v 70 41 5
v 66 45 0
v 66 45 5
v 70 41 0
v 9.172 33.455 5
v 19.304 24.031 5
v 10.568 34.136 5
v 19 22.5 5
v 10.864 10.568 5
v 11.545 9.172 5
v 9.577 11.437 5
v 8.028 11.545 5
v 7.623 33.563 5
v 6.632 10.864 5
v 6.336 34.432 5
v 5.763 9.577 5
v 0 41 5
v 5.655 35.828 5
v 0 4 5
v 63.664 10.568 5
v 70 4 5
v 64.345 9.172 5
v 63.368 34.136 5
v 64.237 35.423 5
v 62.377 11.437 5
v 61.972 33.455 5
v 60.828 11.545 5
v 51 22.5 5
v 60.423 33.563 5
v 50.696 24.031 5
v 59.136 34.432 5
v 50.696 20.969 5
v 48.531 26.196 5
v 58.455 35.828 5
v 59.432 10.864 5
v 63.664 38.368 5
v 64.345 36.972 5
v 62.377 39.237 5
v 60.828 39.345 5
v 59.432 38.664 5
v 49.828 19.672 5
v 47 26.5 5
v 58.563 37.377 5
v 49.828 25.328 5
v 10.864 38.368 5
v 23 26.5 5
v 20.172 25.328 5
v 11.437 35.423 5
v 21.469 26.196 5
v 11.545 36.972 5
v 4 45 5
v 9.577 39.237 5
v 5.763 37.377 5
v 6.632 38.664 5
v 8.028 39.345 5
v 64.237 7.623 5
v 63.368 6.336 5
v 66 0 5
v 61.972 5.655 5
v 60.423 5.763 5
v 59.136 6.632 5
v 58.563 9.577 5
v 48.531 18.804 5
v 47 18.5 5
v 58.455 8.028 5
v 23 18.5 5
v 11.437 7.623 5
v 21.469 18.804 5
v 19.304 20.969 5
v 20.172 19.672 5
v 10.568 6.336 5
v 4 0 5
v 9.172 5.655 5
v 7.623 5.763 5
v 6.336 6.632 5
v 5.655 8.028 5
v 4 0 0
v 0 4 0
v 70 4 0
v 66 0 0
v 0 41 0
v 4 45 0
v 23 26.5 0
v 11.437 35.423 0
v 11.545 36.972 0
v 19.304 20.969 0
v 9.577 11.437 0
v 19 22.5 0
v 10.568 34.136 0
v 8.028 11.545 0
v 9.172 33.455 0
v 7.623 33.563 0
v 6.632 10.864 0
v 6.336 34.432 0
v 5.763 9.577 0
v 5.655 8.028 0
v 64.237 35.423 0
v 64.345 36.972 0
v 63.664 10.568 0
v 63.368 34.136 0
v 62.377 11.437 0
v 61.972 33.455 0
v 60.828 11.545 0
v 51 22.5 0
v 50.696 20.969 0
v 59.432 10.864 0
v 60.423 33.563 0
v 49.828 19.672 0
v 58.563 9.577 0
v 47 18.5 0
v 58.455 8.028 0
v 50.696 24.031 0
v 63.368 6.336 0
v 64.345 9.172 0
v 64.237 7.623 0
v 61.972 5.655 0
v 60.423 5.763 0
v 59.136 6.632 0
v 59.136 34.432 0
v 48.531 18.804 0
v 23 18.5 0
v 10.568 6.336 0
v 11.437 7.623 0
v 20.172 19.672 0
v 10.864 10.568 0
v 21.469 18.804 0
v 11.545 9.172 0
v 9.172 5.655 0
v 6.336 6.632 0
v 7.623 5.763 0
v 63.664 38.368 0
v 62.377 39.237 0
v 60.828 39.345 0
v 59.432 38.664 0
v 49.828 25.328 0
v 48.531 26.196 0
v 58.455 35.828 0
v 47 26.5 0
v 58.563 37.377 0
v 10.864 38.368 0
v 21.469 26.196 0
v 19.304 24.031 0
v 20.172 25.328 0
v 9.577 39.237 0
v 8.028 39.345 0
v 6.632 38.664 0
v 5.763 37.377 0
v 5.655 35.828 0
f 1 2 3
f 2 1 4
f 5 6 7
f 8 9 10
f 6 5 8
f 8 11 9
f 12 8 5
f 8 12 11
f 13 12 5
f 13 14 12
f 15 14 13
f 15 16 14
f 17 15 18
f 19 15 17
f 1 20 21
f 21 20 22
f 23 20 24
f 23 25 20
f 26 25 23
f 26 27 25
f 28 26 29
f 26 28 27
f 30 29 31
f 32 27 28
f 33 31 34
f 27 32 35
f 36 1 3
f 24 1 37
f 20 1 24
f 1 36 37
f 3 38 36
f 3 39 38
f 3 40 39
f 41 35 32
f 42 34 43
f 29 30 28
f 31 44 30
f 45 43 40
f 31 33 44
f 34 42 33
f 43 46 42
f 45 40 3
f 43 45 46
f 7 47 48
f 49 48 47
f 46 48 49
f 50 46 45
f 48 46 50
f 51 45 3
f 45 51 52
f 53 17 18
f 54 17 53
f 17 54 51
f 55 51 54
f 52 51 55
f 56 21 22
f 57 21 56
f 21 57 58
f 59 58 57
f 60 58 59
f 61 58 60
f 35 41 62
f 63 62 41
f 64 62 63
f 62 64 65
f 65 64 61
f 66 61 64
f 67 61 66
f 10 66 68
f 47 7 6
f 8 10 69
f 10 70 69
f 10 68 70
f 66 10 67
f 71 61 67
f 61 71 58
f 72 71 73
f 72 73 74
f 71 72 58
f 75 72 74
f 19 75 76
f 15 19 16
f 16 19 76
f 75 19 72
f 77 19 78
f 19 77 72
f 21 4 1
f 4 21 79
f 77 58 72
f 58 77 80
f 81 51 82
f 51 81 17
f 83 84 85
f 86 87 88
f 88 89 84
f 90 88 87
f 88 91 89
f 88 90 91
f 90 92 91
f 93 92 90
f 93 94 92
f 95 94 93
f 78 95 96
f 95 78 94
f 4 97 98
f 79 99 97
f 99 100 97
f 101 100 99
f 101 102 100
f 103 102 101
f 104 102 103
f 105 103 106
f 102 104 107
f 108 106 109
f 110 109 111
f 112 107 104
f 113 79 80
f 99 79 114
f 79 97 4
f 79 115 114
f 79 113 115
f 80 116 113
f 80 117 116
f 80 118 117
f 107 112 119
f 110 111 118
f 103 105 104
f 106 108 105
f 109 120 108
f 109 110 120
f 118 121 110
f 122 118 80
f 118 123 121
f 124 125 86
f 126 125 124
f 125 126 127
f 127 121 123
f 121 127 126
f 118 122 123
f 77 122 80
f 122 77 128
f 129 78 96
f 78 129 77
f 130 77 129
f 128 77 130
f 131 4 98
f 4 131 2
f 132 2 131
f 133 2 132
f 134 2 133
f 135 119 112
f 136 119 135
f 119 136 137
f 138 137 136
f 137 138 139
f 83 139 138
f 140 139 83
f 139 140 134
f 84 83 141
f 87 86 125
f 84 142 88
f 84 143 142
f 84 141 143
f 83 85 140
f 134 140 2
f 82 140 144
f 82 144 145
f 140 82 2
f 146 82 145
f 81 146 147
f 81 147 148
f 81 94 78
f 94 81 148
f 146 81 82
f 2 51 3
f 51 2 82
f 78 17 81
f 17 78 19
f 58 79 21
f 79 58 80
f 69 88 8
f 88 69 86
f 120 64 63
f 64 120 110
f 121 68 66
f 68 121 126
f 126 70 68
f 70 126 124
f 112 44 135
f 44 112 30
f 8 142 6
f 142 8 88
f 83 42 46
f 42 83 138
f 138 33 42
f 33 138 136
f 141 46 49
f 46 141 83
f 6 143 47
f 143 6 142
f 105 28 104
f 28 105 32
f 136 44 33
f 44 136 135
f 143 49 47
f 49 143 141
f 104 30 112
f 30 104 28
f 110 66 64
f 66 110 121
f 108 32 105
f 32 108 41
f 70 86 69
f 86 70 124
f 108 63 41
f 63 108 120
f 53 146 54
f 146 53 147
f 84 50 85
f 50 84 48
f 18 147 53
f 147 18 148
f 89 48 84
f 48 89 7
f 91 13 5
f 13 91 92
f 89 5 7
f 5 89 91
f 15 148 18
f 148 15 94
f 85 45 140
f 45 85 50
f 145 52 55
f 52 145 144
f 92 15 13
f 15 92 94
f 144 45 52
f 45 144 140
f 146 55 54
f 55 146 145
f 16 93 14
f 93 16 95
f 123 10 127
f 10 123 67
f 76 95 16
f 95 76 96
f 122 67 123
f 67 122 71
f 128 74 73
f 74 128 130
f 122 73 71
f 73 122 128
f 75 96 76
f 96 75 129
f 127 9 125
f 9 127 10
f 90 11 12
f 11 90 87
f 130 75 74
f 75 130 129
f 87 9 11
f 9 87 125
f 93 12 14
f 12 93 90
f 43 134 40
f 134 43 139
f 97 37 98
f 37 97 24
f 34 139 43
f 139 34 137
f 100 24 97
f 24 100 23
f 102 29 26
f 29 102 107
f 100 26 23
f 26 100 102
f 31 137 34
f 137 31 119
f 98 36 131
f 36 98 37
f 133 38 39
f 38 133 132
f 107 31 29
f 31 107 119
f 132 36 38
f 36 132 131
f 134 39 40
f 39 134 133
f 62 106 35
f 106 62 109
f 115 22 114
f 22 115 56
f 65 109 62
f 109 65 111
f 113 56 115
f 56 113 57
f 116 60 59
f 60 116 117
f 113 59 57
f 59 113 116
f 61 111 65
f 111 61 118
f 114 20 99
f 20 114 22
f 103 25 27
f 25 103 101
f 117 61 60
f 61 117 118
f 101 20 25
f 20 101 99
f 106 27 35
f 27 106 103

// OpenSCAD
$fn = 32;

// ----------------------------------------------------------------------
// Bracket plate: slot plate 70 x 45
// ----------------------------------------------------------------------

// --- parameters (mm) ---
hole_r = 3;               // bolt hole radius
plate_t = 5;              // plate thickness, Z (extrusion height)
plate_l = 70;             // plate length
plate_w = 45;             // plate width
slot_l = 24;              // slot straight length
slot_r = 4;               // slot end radius

slot_len = slot_l + 2 * slot_r;
slot_w = 2 * slot_r;
hole_d2 = 2 * hole_r;

profile = [[4, 0], [66, 0], [70, 4], [70, 41], [66, 45], [4, 45], [0, 41], [0, 4]];  // primary outline, 8 points, counter clockwise
void_1 = [[47, 18.5], [48.531, 18.804], [49.828, 19.672], [50.696, 20.969], [51, 22.5], [50.696, 24.031], [49.828, 25.328], [48.531, 26.196], [47, 26.5], [23, 26.5], [21.469, 26.196], [20.172, 25.328], [19.304, 24.031], [19, 22.5], [19.304, 20.969], [20.172, 19.672], [21.469, 18.804], [23, 18.5]];  // grip slot, 18 points
void_2 = [[11.545, 36.972], [10.864, 38.368], [9.577, 39.237], [8.028, 39.345], [6.632, 38.664], [5.763, 37.377], [5.655, 35.828], [6.336, 34.432], [7.623, 33.563], [9.172, 33.455], [10.568, 34.136], [11.437, 35.423]];  // corner hole, 12 points
void_3 = [[11.545, 9.172], [10.864, 10.568], [9.577, 11.437], [8.028, 11.545], [6.632, 10.864], [5.763, 9.577], [5.655, 8.028], [6.336, 6.632], [7.623, 5.763], [9.172, 5.655], [10.568, 6.336], [11.437, 7.623]];  // corner hole, 12 points
void_4 = [[64.345, 36.972], [63.664, 38.368], [62.377, 39.237], [60.828, 39.345], [59.432, 38.664], [58.563, 37.377], [58.455, 35.828], [59.136, 34.432], [60.423, 33.563], [61.972, 33.455], [63.368, 34.136], [64.237, 35.423]];  // corner hole, 12 points
void_5 = [[64.345, 9.172], [63.664, 10.568], [62.377, 11.437], [60.828, 11.545], [59.432, 10.864], [58.563, 9.577], [58.455, 8.028], [59.136, 6.632], [60.423, 5.763], [61.972, 5.655], [63.368, 6.336], [64.237, 7.623]];  // corner hole, 12 points

// --- the one profile operation ---
difference() {
  linear_extrude(height = plate_t) polygon(points = profile);
  translate([0, 0, -1])
    linear_extrude(height = plate_t + 2) polygon(points = void_1);
  translate([0, 0, -1])
    linear_extrude(height = plate_t + 2) polygon(points = void_2);
  translate([0, 0, -1])
    linear_extrude(height = plate_t + 2) polygon(points = void_3);
  translate([0, 0, -1])
    linear_extrude(height = plate_t + 2) polygon(points = void_4);
  translate([0, 0, -1])
    linear_extrude(height = plate_t + 2) polygon(points = void_5);
}
